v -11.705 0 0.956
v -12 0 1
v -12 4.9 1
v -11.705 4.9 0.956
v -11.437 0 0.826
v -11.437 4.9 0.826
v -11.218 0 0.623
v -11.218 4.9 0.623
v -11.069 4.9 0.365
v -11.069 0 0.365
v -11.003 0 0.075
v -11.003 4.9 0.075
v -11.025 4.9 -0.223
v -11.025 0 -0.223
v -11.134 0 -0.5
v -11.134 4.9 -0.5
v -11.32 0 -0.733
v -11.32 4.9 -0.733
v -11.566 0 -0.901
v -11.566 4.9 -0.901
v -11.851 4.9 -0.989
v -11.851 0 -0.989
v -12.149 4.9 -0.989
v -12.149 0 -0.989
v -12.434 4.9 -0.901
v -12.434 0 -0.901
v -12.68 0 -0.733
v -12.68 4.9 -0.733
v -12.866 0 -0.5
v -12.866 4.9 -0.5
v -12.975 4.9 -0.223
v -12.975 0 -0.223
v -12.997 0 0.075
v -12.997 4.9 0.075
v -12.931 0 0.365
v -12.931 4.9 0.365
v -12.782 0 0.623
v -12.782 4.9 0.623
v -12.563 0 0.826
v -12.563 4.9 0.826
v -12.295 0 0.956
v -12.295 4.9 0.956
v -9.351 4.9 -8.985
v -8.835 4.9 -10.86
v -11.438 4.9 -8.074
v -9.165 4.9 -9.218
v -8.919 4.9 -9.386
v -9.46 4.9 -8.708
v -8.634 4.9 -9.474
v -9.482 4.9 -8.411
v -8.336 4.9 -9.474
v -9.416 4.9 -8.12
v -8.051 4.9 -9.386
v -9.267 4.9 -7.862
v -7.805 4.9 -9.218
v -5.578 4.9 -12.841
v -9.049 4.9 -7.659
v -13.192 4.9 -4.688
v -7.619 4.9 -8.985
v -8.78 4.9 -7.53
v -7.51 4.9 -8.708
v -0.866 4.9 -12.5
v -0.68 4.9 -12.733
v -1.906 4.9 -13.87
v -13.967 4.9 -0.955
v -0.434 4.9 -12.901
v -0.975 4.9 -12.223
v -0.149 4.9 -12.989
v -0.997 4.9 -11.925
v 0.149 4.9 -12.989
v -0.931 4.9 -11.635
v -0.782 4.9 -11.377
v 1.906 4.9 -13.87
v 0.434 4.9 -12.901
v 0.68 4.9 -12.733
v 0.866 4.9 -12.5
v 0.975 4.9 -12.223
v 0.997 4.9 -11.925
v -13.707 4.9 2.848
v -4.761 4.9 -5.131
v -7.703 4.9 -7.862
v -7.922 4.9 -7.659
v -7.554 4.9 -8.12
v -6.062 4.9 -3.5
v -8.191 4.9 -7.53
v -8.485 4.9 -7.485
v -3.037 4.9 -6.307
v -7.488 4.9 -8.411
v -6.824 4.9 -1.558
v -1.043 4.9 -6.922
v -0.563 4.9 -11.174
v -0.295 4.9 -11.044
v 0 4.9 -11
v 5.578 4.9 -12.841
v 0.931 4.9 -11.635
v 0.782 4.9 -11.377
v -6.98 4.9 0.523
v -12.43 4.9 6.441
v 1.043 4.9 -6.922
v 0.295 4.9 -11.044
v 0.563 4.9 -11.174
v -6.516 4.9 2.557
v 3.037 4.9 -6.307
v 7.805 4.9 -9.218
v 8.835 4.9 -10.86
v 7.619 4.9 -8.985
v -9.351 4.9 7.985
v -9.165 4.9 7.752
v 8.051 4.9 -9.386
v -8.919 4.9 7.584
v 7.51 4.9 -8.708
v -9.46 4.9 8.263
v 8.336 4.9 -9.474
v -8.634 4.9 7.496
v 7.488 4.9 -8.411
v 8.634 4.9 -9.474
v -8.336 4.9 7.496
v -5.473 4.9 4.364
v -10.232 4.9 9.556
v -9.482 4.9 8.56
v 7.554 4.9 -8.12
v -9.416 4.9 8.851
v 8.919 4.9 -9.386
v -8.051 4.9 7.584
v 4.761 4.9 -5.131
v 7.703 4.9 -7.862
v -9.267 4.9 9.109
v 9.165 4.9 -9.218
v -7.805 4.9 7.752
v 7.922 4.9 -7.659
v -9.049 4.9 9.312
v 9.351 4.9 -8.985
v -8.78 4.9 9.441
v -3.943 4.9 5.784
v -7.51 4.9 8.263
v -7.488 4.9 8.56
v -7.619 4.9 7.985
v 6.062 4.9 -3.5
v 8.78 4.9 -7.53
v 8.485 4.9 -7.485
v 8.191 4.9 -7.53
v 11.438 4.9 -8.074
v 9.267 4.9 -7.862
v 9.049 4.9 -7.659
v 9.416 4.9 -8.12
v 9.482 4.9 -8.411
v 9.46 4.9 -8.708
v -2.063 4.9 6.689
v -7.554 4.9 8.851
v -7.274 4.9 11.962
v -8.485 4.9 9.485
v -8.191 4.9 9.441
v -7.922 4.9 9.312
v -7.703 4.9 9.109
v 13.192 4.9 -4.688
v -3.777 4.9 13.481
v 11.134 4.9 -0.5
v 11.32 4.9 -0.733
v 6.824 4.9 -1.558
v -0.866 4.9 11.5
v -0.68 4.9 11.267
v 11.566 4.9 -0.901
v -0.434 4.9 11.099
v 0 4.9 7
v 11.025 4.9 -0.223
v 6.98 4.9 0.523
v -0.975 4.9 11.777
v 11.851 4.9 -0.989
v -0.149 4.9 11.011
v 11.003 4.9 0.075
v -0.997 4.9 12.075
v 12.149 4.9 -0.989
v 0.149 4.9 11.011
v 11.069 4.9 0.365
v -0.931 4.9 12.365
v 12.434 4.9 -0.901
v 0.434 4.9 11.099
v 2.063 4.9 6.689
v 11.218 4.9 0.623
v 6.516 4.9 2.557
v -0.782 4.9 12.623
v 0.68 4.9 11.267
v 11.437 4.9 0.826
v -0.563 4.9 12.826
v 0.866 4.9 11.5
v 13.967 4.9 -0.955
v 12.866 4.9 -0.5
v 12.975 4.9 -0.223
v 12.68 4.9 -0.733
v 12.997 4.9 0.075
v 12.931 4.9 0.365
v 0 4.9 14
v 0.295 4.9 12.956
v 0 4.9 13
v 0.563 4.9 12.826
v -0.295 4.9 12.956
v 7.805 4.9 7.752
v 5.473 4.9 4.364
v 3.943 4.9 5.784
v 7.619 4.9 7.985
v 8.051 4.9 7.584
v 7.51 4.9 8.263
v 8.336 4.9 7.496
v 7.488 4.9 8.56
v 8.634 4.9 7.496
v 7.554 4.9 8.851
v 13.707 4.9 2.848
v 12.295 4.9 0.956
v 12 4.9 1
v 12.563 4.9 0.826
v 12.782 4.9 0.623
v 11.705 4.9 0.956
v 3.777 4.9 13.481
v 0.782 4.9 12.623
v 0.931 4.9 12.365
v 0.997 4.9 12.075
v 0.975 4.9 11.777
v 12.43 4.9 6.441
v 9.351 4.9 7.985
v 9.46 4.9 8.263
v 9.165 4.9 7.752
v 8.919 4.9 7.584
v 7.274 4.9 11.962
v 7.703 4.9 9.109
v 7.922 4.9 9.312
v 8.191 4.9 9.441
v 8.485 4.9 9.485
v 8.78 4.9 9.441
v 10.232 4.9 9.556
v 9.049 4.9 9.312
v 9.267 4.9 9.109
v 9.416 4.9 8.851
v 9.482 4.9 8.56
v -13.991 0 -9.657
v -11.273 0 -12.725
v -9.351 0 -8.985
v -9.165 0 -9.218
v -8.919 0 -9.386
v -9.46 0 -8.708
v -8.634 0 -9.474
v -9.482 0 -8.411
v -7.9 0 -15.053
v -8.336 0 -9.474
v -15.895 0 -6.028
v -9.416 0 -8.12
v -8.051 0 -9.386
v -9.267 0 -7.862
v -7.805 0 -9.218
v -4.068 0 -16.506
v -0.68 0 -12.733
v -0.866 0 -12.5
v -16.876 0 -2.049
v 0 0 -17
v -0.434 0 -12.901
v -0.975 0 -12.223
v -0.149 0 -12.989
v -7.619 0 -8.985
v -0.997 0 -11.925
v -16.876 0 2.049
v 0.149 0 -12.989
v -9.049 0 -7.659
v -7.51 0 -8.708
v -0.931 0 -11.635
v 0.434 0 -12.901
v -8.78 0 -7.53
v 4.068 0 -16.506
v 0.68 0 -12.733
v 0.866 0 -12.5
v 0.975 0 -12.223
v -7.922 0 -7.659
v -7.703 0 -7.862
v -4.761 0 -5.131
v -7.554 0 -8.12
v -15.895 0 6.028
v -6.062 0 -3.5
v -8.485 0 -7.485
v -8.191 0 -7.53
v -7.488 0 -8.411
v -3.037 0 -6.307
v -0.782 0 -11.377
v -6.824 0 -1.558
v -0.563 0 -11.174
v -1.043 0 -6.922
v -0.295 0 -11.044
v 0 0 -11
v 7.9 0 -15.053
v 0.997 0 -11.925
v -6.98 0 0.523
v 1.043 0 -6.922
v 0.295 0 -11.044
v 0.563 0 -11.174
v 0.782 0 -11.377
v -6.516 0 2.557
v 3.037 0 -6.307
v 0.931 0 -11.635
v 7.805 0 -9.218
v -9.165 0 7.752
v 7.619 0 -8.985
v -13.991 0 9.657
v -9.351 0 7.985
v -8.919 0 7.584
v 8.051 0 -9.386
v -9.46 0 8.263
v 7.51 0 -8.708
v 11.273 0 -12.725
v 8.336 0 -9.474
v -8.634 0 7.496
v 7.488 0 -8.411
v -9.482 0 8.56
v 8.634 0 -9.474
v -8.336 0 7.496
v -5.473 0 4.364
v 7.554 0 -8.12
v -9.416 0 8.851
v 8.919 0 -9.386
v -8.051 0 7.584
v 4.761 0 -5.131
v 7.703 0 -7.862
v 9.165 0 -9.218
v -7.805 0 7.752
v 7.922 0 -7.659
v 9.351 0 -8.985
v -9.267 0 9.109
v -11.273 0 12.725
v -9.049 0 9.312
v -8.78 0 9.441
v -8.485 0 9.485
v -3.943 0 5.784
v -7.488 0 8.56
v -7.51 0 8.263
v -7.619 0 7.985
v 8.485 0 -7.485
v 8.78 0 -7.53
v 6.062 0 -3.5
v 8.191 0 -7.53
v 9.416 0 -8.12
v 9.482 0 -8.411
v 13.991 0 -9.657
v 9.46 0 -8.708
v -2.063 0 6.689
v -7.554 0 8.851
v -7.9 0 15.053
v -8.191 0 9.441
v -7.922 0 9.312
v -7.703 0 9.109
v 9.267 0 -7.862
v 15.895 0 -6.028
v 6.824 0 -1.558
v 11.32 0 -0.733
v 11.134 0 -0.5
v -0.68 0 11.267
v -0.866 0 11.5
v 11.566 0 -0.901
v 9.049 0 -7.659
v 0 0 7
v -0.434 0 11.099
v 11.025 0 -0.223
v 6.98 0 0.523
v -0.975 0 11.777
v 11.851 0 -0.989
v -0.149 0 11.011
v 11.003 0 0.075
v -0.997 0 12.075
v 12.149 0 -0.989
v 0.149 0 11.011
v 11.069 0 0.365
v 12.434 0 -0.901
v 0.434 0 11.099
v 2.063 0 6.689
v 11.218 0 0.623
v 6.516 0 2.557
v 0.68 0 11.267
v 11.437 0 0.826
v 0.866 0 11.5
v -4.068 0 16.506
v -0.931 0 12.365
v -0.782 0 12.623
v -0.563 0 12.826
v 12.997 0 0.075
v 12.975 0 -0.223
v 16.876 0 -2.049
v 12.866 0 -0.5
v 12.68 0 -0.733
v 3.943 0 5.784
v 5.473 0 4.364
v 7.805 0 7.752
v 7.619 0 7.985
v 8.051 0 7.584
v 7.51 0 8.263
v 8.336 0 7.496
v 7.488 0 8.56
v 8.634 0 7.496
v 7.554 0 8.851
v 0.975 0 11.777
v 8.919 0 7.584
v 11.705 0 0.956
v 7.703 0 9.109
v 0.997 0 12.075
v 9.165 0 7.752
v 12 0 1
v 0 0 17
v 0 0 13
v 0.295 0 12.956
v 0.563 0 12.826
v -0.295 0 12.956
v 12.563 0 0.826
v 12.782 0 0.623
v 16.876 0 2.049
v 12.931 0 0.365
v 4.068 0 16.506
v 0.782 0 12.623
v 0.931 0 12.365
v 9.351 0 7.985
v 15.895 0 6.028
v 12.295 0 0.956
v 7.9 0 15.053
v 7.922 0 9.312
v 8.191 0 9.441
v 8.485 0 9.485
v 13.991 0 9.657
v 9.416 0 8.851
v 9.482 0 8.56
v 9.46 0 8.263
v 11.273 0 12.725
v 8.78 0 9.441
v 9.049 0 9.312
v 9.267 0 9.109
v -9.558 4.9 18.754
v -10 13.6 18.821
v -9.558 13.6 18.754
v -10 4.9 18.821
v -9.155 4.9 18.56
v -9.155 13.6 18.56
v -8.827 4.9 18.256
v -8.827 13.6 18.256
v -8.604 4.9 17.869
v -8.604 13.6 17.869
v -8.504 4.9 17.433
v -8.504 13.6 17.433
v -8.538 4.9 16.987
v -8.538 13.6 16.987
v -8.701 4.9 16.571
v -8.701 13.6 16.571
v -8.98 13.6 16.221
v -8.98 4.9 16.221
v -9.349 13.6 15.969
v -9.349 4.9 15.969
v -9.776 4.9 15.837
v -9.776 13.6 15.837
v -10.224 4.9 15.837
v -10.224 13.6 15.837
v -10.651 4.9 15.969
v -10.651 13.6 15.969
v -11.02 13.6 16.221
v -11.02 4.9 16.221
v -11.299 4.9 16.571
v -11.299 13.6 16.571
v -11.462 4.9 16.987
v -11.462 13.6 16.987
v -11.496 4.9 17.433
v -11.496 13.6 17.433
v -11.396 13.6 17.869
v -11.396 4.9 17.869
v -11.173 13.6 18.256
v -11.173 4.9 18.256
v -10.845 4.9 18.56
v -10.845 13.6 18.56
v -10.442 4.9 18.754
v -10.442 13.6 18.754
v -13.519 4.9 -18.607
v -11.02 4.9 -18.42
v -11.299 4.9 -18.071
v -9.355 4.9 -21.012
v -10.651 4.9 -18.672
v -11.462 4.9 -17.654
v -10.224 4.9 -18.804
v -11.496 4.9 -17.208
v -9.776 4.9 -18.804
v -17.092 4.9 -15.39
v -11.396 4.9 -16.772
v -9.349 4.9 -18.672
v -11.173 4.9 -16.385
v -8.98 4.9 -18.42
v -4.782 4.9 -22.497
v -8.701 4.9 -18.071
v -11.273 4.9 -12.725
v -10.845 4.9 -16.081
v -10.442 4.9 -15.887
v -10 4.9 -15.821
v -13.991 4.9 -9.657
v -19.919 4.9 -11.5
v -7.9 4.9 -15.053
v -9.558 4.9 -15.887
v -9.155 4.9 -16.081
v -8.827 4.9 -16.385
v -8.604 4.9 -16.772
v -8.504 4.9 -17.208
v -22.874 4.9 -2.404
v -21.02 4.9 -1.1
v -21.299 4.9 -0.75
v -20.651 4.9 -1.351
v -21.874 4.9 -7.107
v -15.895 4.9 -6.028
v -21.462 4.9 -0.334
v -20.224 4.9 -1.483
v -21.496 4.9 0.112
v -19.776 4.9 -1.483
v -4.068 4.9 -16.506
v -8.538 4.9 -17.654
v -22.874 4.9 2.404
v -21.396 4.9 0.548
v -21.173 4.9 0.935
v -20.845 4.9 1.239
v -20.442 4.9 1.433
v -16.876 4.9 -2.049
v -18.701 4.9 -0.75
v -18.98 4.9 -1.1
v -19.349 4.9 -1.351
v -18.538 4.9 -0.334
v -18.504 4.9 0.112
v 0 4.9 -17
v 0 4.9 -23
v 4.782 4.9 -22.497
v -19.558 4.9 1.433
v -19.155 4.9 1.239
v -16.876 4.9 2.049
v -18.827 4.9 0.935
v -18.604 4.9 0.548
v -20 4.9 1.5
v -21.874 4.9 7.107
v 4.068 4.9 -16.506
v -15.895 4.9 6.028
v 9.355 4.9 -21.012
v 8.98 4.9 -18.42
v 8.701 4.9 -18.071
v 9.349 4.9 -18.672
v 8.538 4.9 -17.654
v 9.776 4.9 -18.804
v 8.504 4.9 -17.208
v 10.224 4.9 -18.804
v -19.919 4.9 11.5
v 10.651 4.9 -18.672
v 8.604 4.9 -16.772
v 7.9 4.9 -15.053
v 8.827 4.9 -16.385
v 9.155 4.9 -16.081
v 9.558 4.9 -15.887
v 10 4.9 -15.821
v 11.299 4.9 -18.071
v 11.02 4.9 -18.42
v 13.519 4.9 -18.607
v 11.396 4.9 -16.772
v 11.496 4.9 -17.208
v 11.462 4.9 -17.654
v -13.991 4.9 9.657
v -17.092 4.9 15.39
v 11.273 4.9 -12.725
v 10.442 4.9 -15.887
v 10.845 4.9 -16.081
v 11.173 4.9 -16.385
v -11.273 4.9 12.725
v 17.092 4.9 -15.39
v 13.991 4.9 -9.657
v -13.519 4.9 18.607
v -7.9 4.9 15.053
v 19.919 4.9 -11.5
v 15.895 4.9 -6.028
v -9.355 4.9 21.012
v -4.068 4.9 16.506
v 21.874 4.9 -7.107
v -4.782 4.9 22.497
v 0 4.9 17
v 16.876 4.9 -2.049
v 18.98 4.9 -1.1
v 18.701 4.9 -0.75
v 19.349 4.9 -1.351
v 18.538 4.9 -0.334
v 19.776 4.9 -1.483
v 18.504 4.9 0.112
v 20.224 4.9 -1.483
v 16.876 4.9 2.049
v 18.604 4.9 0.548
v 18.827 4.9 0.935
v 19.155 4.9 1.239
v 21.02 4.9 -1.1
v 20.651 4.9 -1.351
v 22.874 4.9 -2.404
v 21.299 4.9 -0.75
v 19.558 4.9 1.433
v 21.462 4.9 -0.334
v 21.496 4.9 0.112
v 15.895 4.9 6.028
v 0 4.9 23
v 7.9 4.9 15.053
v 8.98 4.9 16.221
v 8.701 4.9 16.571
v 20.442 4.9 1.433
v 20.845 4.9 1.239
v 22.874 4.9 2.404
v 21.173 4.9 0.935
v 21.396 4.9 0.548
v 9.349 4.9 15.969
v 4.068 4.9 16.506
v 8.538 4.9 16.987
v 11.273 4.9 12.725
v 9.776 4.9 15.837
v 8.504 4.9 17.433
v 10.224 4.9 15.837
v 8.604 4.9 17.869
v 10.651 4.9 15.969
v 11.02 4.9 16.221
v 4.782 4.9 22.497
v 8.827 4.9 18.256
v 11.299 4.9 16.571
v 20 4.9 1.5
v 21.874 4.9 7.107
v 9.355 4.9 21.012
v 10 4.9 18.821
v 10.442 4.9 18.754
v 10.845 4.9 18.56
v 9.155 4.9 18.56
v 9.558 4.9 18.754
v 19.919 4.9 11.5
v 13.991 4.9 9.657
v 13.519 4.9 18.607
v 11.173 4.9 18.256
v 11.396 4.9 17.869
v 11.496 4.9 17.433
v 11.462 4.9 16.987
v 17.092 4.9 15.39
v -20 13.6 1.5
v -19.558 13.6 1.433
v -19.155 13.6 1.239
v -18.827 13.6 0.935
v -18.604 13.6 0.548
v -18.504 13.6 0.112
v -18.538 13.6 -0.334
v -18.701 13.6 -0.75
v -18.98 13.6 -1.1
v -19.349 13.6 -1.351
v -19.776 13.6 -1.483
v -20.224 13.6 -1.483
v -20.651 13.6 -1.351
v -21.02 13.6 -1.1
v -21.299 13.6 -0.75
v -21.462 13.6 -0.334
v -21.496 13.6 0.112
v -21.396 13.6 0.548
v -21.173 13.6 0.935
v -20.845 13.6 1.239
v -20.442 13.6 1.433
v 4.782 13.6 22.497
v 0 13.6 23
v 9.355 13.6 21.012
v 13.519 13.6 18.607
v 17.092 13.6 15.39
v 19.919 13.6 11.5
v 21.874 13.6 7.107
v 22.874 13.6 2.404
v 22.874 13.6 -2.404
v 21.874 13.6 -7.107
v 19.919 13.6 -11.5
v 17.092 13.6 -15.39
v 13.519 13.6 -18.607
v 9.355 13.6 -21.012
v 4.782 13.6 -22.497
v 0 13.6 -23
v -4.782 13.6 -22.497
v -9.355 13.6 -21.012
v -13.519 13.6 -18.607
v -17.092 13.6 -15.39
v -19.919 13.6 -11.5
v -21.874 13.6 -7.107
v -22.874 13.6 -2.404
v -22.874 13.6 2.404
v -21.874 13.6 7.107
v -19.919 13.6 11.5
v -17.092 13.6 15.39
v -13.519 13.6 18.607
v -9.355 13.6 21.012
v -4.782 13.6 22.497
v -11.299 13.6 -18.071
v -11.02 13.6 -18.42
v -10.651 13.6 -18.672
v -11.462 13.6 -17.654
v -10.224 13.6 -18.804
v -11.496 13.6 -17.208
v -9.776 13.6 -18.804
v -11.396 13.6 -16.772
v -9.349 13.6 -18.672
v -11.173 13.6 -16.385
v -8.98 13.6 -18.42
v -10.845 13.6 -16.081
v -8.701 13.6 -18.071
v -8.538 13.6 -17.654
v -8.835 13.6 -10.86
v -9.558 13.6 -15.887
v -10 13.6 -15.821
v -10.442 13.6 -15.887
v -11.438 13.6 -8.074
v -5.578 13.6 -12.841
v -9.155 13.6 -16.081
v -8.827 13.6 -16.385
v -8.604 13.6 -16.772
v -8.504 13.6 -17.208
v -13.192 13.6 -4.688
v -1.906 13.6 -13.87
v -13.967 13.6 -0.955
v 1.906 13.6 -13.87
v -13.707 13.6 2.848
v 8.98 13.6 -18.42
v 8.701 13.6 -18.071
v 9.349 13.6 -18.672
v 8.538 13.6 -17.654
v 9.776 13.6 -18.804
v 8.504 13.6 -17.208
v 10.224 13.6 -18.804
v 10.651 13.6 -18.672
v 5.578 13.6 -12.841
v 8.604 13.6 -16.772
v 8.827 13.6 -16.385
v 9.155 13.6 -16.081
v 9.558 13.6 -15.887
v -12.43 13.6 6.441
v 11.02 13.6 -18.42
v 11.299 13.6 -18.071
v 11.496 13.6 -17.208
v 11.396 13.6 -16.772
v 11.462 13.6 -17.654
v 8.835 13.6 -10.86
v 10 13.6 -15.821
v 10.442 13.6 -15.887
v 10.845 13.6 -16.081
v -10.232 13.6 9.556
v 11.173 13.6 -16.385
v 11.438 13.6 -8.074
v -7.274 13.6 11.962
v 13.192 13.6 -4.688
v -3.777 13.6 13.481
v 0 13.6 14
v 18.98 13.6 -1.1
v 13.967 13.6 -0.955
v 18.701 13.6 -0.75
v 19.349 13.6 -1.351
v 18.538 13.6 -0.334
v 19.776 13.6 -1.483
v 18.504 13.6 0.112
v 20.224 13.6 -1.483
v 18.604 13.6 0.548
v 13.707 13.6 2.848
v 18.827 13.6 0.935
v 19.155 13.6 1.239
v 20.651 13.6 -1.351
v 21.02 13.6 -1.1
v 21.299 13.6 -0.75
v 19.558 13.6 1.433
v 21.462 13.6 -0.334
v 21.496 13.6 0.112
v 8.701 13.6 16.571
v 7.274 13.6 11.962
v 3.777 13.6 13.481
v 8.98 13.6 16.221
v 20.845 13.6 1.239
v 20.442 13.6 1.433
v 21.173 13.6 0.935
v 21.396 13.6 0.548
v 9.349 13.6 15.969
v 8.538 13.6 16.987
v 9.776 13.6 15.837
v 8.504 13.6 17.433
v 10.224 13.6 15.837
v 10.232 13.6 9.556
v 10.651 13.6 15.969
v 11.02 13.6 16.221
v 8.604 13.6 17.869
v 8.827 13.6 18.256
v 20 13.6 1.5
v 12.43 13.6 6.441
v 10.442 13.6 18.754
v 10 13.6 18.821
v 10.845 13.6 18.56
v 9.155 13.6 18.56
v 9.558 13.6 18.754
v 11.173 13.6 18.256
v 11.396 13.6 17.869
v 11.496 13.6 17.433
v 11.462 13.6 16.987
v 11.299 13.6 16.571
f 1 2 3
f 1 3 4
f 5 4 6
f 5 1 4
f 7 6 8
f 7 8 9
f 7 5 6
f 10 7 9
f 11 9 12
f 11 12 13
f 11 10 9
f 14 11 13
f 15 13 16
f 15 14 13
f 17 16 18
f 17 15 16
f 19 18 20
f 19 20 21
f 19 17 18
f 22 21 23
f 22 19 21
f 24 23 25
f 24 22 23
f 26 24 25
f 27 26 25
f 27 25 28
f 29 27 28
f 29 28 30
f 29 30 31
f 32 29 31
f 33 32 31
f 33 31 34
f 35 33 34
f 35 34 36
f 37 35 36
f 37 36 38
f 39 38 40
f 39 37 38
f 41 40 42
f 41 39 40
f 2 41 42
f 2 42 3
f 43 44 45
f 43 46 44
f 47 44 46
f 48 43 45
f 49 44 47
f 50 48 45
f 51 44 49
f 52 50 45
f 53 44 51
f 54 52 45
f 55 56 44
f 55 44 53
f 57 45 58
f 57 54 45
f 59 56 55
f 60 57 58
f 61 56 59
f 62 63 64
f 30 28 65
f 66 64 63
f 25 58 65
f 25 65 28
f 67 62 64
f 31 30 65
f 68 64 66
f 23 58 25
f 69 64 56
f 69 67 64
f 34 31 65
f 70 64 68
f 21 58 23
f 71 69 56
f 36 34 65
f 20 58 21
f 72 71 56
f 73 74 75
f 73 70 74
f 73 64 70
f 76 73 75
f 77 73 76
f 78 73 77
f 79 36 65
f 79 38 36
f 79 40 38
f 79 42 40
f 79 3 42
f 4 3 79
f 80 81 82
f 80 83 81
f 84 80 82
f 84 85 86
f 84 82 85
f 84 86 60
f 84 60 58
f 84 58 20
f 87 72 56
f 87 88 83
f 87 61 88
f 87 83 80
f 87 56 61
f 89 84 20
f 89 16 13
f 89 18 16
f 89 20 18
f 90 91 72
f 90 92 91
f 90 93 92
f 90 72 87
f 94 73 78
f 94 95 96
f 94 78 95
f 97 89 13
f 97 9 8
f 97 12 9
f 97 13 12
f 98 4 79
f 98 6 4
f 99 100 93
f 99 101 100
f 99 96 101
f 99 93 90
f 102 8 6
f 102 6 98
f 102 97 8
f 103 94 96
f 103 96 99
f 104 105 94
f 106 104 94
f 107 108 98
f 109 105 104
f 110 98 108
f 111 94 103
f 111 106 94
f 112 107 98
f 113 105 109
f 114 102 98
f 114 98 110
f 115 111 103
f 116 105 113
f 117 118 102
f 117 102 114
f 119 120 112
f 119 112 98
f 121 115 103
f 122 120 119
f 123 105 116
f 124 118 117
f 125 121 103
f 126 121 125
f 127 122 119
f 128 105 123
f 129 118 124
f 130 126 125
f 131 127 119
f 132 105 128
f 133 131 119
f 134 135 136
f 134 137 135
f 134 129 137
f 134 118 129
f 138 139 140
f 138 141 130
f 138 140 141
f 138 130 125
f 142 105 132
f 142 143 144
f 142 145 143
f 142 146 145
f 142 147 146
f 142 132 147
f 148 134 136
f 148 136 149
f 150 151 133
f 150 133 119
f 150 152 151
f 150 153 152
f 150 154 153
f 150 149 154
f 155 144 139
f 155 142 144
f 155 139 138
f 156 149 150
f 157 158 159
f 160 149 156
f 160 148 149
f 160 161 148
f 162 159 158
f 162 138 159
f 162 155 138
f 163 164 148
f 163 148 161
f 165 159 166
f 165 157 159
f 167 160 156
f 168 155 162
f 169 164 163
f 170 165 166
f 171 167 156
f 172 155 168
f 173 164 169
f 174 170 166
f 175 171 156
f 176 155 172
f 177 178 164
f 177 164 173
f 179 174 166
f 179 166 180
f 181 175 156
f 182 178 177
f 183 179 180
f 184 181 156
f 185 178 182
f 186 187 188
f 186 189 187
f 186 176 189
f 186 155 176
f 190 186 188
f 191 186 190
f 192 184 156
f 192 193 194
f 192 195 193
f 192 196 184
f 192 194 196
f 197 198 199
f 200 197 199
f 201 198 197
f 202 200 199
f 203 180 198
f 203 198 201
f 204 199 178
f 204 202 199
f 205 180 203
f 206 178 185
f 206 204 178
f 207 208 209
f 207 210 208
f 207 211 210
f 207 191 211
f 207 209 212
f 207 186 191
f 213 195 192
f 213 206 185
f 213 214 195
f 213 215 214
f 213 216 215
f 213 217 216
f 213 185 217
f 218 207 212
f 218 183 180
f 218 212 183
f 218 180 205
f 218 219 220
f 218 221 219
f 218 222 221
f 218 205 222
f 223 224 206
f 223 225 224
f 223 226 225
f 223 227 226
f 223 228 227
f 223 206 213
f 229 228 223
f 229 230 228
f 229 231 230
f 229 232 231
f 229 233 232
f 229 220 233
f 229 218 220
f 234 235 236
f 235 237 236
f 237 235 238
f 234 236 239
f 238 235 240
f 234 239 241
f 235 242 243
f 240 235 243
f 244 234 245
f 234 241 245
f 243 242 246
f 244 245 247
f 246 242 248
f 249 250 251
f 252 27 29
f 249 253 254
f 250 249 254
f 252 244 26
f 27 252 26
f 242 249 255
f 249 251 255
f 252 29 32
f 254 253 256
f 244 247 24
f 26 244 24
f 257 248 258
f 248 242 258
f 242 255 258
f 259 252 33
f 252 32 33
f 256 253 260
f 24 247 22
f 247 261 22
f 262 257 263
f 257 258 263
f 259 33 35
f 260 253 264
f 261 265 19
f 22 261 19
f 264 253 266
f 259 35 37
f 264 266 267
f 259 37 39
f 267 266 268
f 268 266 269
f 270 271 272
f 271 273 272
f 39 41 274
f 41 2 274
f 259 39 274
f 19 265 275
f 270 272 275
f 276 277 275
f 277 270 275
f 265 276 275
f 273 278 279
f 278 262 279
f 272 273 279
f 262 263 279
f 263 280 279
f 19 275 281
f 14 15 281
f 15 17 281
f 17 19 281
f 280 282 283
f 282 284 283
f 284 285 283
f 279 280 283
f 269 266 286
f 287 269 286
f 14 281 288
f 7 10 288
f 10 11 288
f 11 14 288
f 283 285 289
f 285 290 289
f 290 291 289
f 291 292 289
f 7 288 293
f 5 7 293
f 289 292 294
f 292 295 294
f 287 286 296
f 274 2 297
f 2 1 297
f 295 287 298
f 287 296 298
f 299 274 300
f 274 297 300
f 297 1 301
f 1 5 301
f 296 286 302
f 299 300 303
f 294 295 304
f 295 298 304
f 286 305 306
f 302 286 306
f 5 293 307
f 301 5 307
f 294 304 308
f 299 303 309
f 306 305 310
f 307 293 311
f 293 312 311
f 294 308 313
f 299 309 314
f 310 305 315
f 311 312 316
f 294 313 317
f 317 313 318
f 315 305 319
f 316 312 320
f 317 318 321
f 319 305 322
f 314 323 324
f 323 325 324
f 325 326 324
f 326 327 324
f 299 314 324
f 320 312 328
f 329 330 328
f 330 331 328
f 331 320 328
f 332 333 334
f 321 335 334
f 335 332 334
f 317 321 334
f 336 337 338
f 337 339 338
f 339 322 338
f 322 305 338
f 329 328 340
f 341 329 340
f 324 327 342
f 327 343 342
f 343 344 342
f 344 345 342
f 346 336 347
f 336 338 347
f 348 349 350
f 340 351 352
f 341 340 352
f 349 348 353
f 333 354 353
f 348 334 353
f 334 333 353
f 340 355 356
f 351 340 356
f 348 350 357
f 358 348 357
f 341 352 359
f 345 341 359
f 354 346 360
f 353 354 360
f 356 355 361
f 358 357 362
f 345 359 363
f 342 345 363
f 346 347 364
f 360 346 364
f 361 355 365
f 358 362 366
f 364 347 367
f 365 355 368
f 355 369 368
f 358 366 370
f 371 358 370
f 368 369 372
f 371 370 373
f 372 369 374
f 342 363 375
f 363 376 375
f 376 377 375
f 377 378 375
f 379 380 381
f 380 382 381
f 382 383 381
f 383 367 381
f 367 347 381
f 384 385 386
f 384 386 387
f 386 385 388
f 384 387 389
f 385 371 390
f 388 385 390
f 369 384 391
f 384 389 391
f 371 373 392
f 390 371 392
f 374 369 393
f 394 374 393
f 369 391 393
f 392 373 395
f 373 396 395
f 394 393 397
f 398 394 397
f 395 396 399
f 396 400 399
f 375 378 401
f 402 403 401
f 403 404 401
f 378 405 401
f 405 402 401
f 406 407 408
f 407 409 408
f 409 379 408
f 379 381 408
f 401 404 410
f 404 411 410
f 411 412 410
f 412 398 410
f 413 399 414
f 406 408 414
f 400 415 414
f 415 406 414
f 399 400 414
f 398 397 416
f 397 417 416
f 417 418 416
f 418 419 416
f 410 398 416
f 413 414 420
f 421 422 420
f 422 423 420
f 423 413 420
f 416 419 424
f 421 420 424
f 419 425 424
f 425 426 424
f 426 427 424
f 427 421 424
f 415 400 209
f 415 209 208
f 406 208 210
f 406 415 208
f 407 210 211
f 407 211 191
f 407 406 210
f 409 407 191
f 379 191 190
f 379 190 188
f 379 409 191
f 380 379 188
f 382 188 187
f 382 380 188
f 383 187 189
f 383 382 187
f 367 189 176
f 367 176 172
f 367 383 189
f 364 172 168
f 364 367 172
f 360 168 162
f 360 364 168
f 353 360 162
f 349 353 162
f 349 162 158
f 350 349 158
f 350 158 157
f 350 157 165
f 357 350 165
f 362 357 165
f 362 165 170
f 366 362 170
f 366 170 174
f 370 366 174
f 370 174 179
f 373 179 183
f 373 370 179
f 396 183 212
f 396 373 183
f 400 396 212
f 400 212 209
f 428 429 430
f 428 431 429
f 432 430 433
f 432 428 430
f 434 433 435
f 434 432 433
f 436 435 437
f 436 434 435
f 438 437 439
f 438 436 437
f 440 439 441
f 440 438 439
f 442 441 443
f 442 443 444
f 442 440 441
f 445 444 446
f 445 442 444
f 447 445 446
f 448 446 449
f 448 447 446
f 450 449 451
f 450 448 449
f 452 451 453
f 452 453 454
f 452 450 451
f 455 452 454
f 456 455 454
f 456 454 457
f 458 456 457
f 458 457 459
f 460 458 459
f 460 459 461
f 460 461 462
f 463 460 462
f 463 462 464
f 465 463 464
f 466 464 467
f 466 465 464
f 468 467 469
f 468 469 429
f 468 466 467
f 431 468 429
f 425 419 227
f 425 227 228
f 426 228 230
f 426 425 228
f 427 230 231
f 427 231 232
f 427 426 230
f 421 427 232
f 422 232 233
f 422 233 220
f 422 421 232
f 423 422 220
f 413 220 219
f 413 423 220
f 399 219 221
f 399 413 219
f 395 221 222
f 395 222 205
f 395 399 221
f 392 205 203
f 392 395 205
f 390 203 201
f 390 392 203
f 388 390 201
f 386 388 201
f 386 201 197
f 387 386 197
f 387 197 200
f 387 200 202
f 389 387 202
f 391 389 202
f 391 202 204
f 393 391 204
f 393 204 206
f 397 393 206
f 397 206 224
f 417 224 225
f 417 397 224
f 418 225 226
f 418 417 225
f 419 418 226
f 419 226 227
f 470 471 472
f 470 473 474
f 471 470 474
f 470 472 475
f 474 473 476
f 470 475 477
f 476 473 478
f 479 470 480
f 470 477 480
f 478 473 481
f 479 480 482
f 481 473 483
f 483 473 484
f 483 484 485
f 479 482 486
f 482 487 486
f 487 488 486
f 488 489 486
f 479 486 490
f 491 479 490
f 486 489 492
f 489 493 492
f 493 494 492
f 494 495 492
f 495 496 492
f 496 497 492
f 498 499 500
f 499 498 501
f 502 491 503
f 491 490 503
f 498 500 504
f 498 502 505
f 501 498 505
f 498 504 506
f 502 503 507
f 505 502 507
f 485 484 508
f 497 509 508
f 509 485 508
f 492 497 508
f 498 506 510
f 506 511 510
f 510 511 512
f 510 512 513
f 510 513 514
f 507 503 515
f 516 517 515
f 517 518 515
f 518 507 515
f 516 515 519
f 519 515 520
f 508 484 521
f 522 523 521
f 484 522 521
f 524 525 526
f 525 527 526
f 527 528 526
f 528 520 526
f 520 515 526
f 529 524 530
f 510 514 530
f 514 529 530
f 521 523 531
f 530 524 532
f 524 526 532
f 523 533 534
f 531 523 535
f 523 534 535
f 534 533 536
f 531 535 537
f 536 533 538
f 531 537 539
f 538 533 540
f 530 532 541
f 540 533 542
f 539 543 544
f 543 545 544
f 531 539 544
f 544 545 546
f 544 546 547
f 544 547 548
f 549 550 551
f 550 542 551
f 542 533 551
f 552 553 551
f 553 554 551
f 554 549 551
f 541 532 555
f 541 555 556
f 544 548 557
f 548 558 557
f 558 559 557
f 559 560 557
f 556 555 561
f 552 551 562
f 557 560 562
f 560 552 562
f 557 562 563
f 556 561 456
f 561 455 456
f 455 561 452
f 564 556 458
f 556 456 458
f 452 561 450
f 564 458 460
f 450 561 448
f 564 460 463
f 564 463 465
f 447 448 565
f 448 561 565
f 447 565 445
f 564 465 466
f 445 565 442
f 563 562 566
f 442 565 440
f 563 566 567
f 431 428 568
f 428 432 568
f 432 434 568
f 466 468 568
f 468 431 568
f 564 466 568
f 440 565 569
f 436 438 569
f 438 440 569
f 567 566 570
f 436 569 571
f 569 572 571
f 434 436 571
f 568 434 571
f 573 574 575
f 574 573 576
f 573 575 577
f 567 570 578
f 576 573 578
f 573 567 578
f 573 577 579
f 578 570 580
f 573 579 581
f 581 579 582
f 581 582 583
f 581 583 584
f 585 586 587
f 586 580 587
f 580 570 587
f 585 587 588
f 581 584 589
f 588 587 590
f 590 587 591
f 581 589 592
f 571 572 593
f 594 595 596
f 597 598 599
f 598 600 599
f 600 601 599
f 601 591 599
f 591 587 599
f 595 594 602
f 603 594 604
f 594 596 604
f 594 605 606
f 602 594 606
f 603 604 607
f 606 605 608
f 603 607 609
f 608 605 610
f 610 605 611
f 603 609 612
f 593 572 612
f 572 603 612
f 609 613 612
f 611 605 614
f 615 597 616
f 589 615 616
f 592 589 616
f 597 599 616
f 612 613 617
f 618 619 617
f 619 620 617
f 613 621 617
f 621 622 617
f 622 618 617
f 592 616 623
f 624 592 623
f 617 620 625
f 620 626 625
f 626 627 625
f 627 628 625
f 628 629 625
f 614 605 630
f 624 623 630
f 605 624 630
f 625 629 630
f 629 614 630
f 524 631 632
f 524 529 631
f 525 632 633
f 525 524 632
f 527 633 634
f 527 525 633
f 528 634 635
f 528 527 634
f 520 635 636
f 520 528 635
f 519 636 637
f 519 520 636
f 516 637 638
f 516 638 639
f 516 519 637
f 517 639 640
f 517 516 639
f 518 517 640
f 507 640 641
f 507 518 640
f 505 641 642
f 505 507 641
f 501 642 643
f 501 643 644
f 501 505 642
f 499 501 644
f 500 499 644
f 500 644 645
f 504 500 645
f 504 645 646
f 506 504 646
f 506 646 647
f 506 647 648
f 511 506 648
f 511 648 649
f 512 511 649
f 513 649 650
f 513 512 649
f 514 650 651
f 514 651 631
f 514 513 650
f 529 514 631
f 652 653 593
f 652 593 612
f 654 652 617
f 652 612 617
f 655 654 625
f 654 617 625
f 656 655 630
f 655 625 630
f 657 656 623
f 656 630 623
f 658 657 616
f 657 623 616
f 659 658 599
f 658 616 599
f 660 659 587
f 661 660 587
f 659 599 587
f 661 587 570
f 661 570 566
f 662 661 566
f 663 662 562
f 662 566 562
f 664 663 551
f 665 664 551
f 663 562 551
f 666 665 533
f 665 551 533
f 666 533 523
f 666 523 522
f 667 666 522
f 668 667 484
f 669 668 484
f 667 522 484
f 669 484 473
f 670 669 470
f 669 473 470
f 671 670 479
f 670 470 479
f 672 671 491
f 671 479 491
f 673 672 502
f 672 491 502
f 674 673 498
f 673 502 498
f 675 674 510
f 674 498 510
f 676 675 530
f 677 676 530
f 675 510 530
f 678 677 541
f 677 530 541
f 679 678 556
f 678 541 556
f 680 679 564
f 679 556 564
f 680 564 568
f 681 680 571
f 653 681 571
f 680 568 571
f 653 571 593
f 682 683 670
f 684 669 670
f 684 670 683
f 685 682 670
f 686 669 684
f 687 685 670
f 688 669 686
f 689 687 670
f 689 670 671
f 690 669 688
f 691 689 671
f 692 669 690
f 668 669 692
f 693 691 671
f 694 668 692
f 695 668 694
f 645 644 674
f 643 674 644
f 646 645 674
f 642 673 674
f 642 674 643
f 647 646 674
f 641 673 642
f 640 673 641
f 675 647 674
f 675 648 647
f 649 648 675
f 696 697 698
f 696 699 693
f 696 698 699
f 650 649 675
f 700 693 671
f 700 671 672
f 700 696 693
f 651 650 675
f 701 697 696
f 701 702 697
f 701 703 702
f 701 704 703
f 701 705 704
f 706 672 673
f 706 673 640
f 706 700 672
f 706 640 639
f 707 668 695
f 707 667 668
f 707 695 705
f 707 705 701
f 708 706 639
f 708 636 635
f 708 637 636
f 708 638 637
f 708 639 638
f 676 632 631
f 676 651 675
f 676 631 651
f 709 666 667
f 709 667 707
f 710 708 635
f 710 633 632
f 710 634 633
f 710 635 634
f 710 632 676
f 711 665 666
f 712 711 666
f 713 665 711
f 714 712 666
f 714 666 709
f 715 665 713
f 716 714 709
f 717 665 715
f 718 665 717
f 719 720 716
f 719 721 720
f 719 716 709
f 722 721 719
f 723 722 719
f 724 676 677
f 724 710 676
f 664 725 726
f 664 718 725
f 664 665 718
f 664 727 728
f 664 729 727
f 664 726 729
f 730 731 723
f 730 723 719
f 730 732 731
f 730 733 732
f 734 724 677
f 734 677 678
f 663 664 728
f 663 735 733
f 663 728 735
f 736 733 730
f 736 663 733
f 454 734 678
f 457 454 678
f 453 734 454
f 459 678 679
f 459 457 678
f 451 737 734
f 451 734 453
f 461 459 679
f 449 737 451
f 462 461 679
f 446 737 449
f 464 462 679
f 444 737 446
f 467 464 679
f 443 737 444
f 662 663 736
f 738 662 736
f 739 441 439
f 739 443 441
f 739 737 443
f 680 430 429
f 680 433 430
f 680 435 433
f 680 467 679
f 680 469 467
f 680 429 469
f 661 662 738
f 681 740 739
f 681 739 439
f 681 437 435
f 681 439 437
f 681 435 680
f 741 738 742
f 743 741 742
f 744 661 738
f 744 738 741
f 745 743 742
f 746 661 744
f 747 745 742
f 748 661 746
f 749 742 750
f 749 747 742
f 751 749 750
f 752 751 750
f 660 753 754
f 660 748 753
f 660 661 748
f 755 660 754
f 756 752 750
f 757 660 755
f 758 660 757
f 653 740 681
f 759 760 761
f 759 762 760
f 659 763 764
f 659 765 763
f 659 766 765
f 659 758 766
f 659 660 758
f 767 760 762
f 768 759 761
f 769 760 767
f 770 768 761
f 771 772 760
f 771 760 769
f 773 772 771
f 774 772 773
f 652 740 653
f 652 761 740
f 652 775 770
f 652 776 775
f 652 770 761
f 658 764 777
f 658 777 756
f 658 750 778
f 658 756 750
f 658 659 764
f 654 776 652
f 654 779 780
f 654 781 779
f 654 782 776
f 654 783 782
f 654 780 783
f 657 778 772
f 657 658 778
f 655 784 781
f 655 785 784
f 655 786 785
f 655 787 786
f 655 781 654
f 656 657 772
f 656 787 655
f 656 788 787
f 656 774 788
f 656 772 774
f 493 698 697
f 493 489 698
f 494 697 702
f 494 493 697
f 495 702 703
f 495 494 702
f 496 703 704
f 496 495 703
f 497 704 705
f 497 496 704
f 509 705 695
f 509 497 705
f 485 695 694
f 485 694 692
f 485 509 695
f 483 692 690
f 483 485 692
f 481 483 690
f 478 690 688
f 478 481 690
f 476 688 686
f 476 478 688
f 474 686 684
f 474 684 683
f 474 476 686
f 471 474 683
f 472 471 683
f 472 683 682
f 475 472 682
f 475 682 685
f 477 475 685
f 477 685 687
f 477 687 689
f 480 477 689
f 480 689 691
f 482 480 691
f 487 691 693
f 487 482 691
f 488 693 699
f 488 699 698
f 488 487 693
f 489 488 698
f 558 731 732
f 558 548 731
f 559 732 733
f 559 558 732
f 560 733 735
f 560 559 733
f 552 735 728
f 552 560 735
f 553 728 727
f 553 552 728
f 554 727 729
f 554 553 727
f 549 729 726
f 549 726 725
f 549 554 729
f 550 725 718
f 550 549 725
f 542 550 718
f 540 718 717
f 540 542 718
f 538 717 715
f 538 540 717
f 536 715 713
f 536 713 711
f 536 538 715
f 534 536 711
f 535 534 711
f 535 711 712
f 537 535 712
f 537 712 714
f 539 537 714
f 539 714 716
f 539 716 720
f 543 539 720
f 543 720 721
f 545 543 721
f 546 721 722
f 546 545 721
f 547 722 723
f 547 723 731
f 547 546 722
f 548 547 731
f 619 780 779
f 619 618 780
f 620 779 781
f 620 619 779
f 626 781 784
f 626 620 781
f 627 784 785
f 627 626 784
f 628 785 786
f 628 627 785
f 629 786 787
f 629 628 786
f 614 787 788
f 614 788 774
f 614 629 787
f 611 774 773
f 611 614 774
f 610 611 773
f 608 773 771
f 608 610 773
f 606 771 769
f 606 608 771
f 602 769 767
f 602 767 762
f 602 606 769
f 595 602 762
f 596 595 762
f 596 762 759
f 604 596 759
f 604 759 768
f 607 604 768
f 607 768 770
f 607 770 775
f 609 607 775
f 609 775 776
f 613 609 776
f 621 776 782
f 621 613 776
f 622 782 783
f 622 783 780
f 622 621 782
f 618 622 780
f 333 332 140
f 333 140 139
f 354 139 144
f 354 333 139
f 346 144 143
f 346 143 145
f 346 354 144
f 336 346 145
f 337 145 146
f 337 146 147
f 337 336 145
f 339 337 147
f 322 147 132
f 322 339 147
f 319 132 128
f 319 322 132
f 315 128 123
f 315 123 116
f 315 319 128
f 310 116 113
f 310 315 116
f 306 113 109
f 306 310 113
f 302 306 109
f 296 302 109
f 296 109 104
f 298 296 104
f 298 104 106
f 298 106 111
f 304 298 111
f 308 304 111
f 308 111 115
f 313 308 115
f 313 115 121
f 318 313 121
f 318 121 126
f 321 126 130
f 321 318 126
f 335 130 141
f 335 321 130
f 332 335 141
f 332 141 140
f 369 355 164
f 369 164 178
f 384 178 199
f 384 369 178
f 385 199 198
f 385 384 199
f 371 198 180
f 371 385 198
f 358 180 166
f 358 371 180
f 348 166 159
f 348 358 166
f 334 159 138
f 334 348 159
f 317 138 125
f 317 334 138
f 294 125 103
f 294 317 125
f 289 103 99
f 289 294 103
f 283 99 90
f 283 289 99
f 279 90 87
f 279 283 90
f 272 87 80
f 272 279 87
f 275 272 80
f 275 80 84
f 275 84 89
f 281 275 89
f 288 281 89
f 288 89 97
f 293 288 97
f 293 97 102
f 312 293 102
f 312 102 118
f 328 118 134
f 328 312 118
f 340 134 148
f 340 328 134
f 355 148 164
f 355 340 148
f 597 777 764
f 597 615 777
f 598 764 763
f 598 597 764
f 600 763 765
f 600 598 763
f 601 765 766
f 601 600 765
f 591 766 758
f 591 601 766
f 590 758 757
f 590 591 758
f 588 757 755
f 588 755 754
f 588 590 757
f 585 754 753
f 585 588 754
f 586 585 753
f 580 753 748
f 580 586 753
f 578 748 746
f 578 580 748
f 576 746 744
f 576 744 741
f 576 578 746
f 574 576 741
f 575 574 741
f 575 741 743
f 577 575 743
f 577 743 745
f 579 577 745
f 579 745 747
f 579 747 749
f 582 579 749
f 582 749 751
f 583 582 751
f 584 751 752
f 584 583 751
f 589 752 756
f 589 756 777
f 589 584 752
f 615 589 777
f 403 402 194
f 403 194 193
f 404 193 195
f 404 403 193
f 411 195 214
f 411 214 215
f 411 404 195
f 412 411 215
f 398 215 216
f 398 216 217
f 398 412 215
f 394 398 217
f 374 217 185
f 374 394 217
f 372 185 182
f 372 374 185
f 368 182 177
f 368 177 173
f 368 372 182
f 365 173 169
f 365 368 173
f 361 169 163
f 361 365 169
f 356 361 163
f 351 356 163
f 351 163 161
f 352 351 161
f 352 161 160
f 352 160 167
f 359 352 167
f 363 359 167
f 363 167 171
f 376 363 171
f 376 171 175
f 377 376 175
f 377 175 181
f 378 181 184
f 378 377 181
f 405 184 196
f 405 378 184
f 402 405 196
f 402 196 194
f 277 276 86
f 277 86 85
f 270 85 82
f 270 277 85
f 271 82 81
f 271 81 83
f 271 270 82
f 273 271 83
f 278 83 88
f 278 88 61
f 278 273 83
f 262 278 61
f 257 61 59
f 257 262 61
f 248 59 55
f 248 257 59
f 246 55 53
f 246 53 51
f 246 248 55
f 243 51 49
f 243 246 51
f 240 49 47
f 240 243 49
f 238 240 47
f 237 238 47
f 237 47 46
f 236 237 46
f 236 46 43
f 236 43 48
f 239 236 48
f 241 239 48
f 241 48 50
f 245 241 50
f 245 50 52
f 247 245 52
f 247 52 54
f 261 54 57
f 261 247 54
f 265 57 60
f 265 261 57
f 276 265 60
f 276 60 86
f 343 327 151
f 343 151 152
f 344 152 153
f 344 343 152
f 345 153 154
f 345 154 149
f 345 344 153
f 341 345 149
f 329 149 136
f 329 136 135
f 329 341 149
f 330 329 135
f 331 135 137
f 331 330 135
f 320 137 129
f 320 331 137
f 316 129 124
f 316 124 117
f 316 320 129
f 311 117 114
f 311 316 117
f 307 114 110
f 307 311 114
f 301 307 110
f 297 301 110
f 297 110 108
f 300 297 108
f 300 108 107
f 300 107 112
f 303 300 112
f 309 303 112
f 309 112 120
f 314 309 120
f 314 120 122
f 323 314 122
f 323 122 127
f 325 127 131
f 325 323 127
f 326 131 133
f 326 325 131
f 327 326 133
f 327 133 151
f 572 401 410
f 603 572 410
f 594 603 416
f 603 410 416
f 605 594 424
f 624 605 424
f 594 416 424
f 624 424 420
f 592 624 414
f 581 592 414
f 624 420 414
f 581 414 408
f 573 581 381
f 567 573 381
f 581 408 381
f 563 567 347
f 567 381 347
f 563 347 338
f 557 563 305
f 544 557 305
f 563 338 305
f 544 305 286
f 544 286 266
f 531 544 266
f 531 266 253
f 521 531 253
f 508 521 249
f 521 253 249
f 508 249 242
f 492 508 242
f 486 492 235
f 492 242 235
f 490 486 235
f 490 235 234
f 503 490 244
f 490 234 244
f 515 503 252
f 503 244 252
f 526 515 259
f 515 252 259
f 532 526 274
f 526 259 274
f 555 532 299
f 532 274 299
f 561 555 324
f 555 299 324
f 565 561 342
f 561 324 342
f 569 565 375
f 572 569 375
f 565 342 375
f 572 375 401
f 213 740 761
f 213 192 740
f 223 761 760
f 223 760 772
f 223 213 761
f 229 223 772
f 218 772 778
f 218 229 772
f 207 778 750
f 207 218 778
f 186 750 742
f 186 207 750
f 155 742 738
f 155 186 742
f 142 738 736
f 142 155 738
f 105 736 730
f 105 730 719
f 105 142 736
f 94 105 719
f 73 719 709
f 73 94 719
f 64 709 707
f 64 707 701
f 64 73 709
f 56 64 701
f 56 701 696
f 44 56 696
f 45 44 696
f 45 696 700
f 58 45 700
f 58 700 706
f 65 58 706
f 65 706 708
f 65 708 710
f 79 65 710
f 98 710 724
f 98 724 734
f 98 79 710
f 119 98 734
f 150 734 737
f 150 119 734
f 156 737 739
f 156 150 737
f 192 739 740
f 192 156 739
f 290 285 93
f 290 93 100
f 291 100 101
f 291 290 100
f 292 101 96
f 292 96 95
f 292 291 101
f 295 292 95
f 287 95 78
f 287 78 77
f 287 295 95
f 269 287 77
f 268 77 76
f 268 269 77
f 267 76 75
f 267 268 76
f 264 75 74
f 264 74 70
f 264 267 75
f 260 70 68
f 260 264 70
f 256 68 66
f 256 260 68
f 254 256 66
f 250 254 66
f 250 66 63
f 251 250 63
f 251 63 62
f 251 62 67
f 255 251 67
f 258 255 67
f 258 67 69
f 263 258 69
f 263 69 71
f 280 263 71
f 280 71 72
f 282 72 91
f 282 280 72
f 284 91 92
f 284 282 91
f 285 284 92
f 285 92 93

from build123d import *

# Parameters (mm, degrees)
SKETCH_1_R      = 17
SKETCH_1_R_2    = 1
SKETCH_1_R_3    = 7
EXTRUDE_1_DEPTH = 4.9
SKETCH_2_R      = 23
SKETCH_2_R_2    = 1.5
SKETCH_2_R_3    = 17
SKETCH_2_R_4    = 14
EXTRUDE_2_DEPTH = 6
SKETCH_3_R      = 23
SKETCH_3_R_2    = 14
SKETCH_3_R_3    = 1.5
EXTRUDE_3_DEPTH = 2.7


with BuildPart() as part:
    # 草图1 → 凸台-拉伸1 (new body)
    with BuildSketch(Plane(origin=(0, 0, 0), x_dir=(1, 0, 0), z_dir=(0, 1, 0))):
        with Locations(Location((0, 0, 0), (0, 0, 270))):
            Circle(SKETCH_1_R)
        with Locations(Location((8.485281374, -8.485281374, 0), (0, 0, 270))):
            Circle(SKETCH_1_R_2, mode=Mode.SUBTRACT)
        with Locations(Location((8.485281374, 8.485281374, 0), (0, 0, 270))):
            Circle(SKETCH_1_R_2, mode=Mode.SUBTRACT)
        with Locations(Location((0, -12, 0), (0, 0, 270))):
            Circle(SKETCH_1_R_2, mode=Mode.SUBTRACT)
        with Locations(Location((12, 0, 0), (0, 0, 270))):
            Circle(SKETCH_1_R_2, mode=Mode.SUBTRACT)
        with Locations(Location((0, 12, 0), (0, 0, 270))):
            Circle(SKETCH_1_R_2, mode=Mode.SUBTRACT)
        with Locations(Location((0, 0, 0), (0, 0, 270))):
            Circle(SKETCH_1_R_3, mode=Mode.SUBTRACT)
        with Locations(Location((-12, 0, 0), (0, 0, 270))):
            Circle(SKETCH_1_R_2, mode=Mode.SUBTRACT)
        with Locations(Location((-8.485281374, -8.485281374, 0), (0, 0, 270))):
            Circle(SKETCH_1_R_2, mode=Mode.SUBTRACT)
        with Locations(Location((-8.485281374, 8.485281374, 0), (0, 0, 270))):
            Circle(SKETCH_1_R_2, mode=Mode.SUBTRACT)
    extrude(amount=EXTRUDE_1_DEPTH)

    # 草图2 → 凸台-拉伸2 (add)
    # profile 1 of 2: a face of its own
    with BuildSketch(Plane(origin=(0, 4.9, 0), x_dir=(1, 0, 0), z_dir=(0, 1, 0))):
        with Locations(Location((0, 0, 0), (0, 0, 270))):
            Circle(SKETCH_2_R)
        with Locations(Location((-10, -17.320508076, 0), (0, 0, 270))):
            Circle(SKETCH_2_R_2, mode=Mode.SUBTRACT)
        with Locations(Location((-10, 17.320508076, 0), (0, 0, 270))):
            Circle(SKETCH_2_R_2, mode=Mode.SUBTRACT)
        with Locations(Location((10, 17.320508076, 0), (0, 0, 270))):
            Circle(SKETCH_2_R_2, mode=Mode.SUBTRACT)
        with Locations(Location((20, 0, 0), (0, 0, 270))):
            Circle(SKETCH_2_R_2, mode=Mode.SUBTRACT)
        with Locations(Location((-20, 0, 0), (0, 0, 270))):
            Circle(SKETCH_2_R_2, mode=Mode.SUBTRACT)
        with Locations(Location((10, -17.320508076, 0), (0, 0, 270))):
            Circle(SKETCH_2_R_2, mode=Mode.SUBTRACT)
        with Locations(Location((0, 0, 0), (0, 0, 270))):
            Circle(SKETCH_2_R_3, mode=Mode.SUBTRACT)
    # profile 2 of 2: a face of its own
    with BuildSketch(Plane(origin=(0, 4.9, 0), x_dir=(1, 0, 0), z_dir=(0, 1, 0))):
        with Locations(Location((0, 0, 0), (0, 0, 270))):
            Circle(SKETCH_2_R_3)
        with Locations(Location((0, 0, 0), (0, 0, 270))):
            Circle(SKETCH_2_R_4, mode=Mode.SUBTRACT)
    extrude(amount=EXTRUDE_2_DEPTH)

    # 草图3 → 凸台-拉伸3 (add)
    with BuildSketch(Plane(origin=(0, 10.9, 0), x_dir=(1, 0, 0), z_dir=(0, 1, 0))):
        with Locations(Location((0, 0, 0), (0, 0, 270))):
            Circle(SKETCH_3_R)
        with Locations(Location((0, 0, 0), (0, 0, 270))):
            Circle(SKETCH_3_R_2, mode=Mode.SUBTRACT)
        with Locations(Location((10, -17.320508076, 0), (0, 0, 270))):
            Circle(SKETCH_3_R_3, mode=Mode.SUBTRACT)
        with Locations(Location((20, 0, 0), (0, 0, 270))):
            Circle(SKETCH_3_R_3, mode=Mode.SUBTRACT)
        with Locations(Location((10, 17.320508076, 0), (0, 0, 270))):
            Circle(SKETCH_3_R_3, mode=Mode.SUBTRACT)
        with Locations(Location((-10, -17.320508076, 0), (0, 0, 270))):
            Circle(SKETCH_3_R_3, mode=Mode.SUBTRACT)
        with Locations(Location((-20, 0, 0), (0, 0, 270))):
            Circle(SKETCH_3_R_3, mode=Mode.SUBTRACT)
        with Locations(Location((-10, 17.320508076, 0), (0, 0, 270))):
            Circle(SKETCH_3_R_3, mode=Mode.SUBTRACT)
    extrude(amount=EXTRUDE_3_DEPTH)


solid = part.part
